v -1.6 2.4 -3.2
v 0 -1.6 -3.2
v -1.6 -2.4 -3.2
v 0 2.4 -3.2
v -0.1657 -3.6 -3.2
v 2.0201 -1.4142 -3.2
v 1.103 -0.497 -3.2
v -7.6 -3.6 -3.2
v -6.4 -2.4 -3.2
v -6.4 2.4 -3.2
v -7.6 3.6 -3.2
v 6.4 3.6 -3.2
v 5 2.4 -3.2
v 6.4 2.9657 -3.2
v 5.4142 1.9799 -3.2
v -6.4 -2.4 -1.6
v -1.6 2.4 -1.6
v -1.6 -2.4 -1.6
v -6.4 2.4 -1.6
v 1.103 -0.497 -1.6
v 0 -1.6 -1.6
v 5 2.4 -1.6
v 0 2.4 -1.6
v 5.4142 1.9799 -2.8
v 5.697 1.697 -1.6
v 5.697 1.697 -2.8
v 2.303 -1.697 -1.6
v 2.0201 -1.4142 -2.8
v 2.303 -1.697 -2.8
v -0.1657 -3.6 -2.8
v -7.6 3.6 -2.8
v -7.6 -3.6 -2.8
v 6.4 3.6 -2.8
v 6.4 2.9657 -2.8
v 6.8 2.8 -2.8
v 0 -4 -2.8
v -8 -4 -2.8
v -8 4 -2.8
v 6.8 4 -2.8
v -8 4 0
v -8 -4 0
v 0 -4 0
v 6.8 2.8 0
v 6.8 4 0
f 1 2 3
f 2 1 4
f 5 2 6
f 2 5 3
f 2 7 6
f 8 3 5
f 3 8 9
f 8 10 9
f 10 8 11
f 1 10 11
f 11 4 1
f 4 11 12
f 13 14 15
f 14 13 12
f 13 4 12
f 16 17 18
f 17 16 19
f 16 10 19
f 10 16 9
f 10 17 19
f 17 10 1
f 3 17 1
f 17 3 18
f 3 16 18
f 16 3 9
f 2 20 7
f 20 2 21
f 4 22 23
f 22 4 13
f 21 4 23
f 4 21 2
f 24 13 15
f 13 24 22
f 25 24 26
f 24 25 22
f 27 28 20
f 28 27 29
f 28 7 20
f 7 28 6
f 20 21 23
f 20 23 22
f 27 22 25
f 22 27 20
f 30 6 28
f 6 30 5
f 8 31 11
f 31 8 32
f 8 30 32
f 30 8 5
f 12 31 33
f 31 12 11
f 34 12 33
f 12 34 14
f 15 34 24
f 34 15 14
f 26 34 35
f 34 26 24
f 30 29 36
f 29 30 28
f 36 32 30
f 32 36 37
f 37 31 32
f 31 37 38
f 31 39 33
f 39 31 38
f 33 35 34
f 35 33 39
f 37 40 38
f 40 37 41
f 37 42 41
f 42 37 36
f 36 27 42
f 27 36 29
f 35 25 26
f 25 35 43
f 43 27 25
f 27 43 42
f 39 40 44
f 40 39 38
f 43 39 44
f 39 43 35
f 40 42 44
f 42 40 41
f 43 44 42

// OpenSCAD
// file: ../p/rect3.scad
use <../lib.scad>
function ldraw_lib__rect3() = [
// 0 Rectangle with 3 Edges
// 0 Name: rect3.dat
// 0 Author: Mark Kennedy [mkennedy]
// 0 !LDRAW_ORG Primitive UPDATE 2010-01
// 0 !LICENSE Licensed under CC BY 4.0 : see CAreadme.txt
// 
// 0 BFC CERTIFY CCW
  [0,"BFC","CERTIFY"],
  [0,"BFC","CCW"],
// 
// 0 !HISTORY 2003-08-01 [PTadmin] Official Update 2003-02
// 0 !HISTORY 2007-06-24 [PTadmin] Header formatted for Contributor Agreement
// 0 !HISTORY 2008-07-01 [PTadmin] Official Update 2008-01
// 0 !HISTORY 2010-01-17 [mikeheide] Change winding to CCW
// 0 !HISTORY 2010-04-05 [PTadmin] Official Update 2010-01
// 
// 
// 2 24 1 0 1 -1 0 1
  [2,24,1,0,1,-1,0,1],
// 2 24 1 0 1 1 0 -1
  [2,24,1,0,1,1,0,-1],
// 2 24 -1 0 1 -1 0 -1
  [2,24,-1,0,1,-1,0,-1],
// 4 16 -1 0 1 -1 0 -1 1 0 -1 1 0 1
  [4,16,-1,0,1,-1,0,-1,1,0,-1,1,0,1],
// 0 //
];
module ldraw_lib__rect3(step=0, col=false, unit=2/5, alt=false, line=0.2, solid=!$preview)
    makepoly(ldraw_lib__rect3(), step=step, col=col, unit=unit, alt=alt, line=line, solid=solid);
ldraw_lib__rect3(line=0.2);
// file: ../p/rect.scad
use <../lib.scad>
function ldraw_lib__rect() = [
// 0 Rectangle
// 0 Name: rect.dat
// 0 Author: James Jessiman
// 0 !LDRAW_ORG Primitive UPDATE 2010-01
// 0 !LICENSE Licensed under CC BY 4.0 : see CAreadme.txt
// 
// 0 BFC CERTIFY CCW
  [0,"BFC","CERTIFY"],
  [0,"BFC","CCW"],
// 
// 0 !HISTORY 2002-04-05 [hafhead] Added BFC statement
// 0 !HISTORY 2002-04-25 [PTadmin] Official Update 2002-02
// 0 !HISTORY 2007-06-24 [PTadmin] Header formatted for Contributor Agreement
// 0 !HISTORY 2008-07-01 [PTadmin] Official Update 2008-01
// 0 !HISTORY 2010-01-17 [mikeheide] changed winding to CCW
// 0 !HISTORY 2010-04-05 [PTadmin] Official Update 2010-01
// 
// 
// 2 24 1 0 1 -1 0 1
  [2,24,1,0,1,-1,0,1],
// 2 24 -1 0 1 -1 0 -1
  [2,24,-1,0,1,-1,0,-1],
// 2 24 -1 0 -1 1 0 -1
  [2,24,-1,0,-1,1,0,-1],
// 2 24 1 0 -1 1 0 1
  [2,24,1,0,-1,1,0,1],
// 4 16 -1 0 1 -1 0 -1 1 0 -1 1 0 1
  [4,16,-1,0,1,-1,0,-1,1,0,-1,1,0,1],
// 0
];
module ldraw_lib__rect(step=0, col=false, unit=2/5, alt=false, line=0.2, solid=!$preview)
    makepoly(ldraw_lib__rect(), step=step, col=col, unit=unit, alt=alt, line=line, solid=solid);
ldraw_lib__rect(line=0.2);
// file: ../p/box5.scad
use <../lib.scad>
function ldraw_lib__box5() = [
// 0 Box with 5 Faces and All Edges
// 0 Name: box5.dat
// 0 Author: James Jessiman
// 0 !LDRAW_ORG Primitive UPDATE 2012-01
// 0 !LICENSE Licensed under CC BY 4.0 : see CAreadme.txt
// 
// 0 BFC CERTIFY CCW
  [0,"BFC","CERTIFY"],
  [0,"BFC","CCW"],
// 
// 0 !HISTORY 2002-04-03 [sbliss] Modified for BFC compliance
// 0 !HISTORY 2002-04-25 [PTadmin] Official Update 2002-02
// 0 !HISTORY 2007-06-24 [PTadmin] Header formatted for Contributor Agreement
// 0 !HISTORY 2008-07-01 [PTadmin] Official Update 2008-01
// 0 !HISTORY 2012-02-16 [Philo] Changed to CCW
// 0 !HISTORY 2012-03-30 [PTadmin] Official Update 2012-01
// 
// 
// 2 24 1 1 1 -1 1 1
  [2,24,1,1,1,-1,1,1],
// 2 24 -1 1 1 -1 1 -1
  [2,24,-1,1,1,-1,1,-1],
// 2 24 -1 1 -1 1 1 -1
  [2,24,-1,1,-1,1,1,-1],
// 2 24 1 1 -1 1 1 1
  [2,24,1,1,-1,1,1,1],
// 2 24 1 0 1 -1 0 1
  [2,24,1,0,1,-1,0,1],
// 2 24 -1 0 1 -1 0 -1
  [2,24,-1,0,1,-1,0,-1],
// 2 24 -1 0 -1 1 0 -1
  [2,24,-1,0,-1,1,0,-1],
// 2 24 1 0 -1 1 0 1
  [2,24,1,0,-1,1,0,1],
// 2 24 1 0 1 1 1 1
  [2,24,1,0,1,1,1,1],
// 2 24 -1 0 1 -1 1 1
  [2,24,-1,0,1,-1,1,1],
// 2 24 1 0 -1 1 1 -1
  [2,24,1,0,-1,1,1,-1],
// 2 24 -1 0 -1 -1 1 -1
  [2,24,-1,0,-1,-1,1,-1],
// 4 16 -1 1 1 1 1 1 1 1 -1 -1 1 -1
  [4,16,-1,1,1,1,1,1,1,1,-1,-1,1,-1],
// 4 16 -1 1 1 -1 0 1 1 0 1 1 1 1
  [4,16,-1,1,1,-1,0,1,1,0,1,1,1,1],
// 4 16 -1 1 -1 -1 0 -1 -1 0 1 -1 1 1
  [4,16,-1,1,-1,-1,0,-1,-1,0,1,-1,1,1],
// 4 16 1 1 -1 1 0 -1 -1 0 -1 -1 1 -1
  [4,16,1,1,-1,1,0,-1,-1,0,-1,-1,1,-1],
// 4 16 1 1 1 1 0 1 1 0 -1 1 1 -1
  [4,16,1,1,1,1,0,1,1,0,-1,1,1,-1],
];
module ldraw_lib__box5(step=0, col=false, unit=2/5, alt=false, line=0.2, solid=!$preview)
    makepoly(ldraw_lib__box5(), step=step, col=col, unit=unit, alt=alt, line=line, solid=solid);
ldraw_lib__box5(line=0.2);
// file: ../p/box2-7.scad
use <../lib.scad>
function ldraw_lib__box2_7() = [
// 0 Box with  2 Faces without  7 Edges
// 0 Name: box2-7.dat
// 0 Author: Willy Tschager [Holly-Wood]
// 0 !LDRAW_ORG Primitive UPDATE 2024-01
// 0 !LICENSE Licensed under CC BY 4.0 : see CAreadme.txt
// 
// 0 BFC CERTIFY CCW
  [0,"BFC","CERTIFY"],
  [0,"BFC","CCW"],
// 
// 0 !HISTORY 2009-05-02 [PTadmin] Official Update 2009-01
// 0 !HISTORY 2024-01-02 [Holly-Wood] Complete re-write, original by guyvivan
// 0 !HISTORY 2024-01-29 [OrionP] Official Update 2024-01
// 
// 2 24 -1 1 -1 -1 1 1
  [2,24,-1,1,-1,-1,1,1],
// 2 24 1 1 1 1 1 -1
  [2,24,1,1,1,1,1,-1],
// 4 16 -1 1 1 1 1 1 1 1 -1 -1 1 -1
  [4,16,-1,1,1,1,1,1,1,1,-1,-1,1,-1],
// 
// 2 24 -1 1 1 -1 -1 1
  [2,24,-1,1,1,-1,-1,1],
// 2 24 1 1 1 1 -1 1
  [2,24,1,1,1,1,-1,1],
// 4 16 1 -1 1 1 1 1 -1 1 1 -1 -1 1
  [4,16,1,-1,1,1,1,1,-1,1,1,-1,-1,1],
// 
// 2 24 -1 1 1 1 1 1
  [2,24,-1,1,1,1,1,1],
];
module ldraw_lib__box2_7(step=0, col=false, unit=2/5, alt=false, line=0.2, solid=!$preview)
    makepoly(ldraw_lib__box2_7(), step=step, col=col, unit=unit, alt=alt, line=line, solid=solid);
ldraw_lib__box2_7(line=0.2);
// file: ../p/box2-5.scad
use <../lib.scad>
function ldraw_lib__box2_5() = [
// 0 Box with 2 Faces without 5 Edges
// 0 Name: box2-5.dat
// 0 Author: Steffen [Steffen]
// 0 !LDRAW_ORG Primitive UPDATE 2003-03
// 0 !LICENSE Licensed under CC BY 4.0 : see CAreadme.txt
// 
// 0 BFC CERTIFY CCW
  [0,"BFC","CERTIFY"],
  [0,"BFC","CCW"],
// 
// 0 !HISTORY 2003-12-19 [PTadmin] Official Update 2003-03
// 0 !HISTORY 2007-06-24 [PTadmin] Header formatted for Contributor Agreement
// 0 !HISTORY 2008-07-01 [PTadmin] Official Update 2008-01
// 
// 
// 2 24 1 1 1 -1 1 1
  [2,24,1,1,1,-1,1,1],
// 2 24 1 1 -1 -1 1 -1
  [2,24,1,1,-1,-1,1,-1],
// 2 24 1 -1 1 -1 -1 1
  [2,24,1,-1,1,-1,-1,1],
// 2 24 -1 -1 1 -1 1 1
  [2,24,-1,-1,1,-1,1,1],
// 2 24 1 -1 1 1 1 1
  [2,24,1,-1,1,1,1,1],
// 2 24 -1 1 -1 -1 1 1
  [2,24,-1,1,-1,-1,1,1],
// 2 24 1 1 -1 1 1 1
  [2,24,1,1,-1,1,1,1],
// 4 16 1 1 1 1 1 -1 -1 1 -1 -1 1 1
  [4,16,1,1,1,1,1,-1,-1,1,-1,-1,1,1],
// 4 16 1 1 1 -1 1 1 -1 -1 1 1 -1 1
  [4,16,1,1,1,-1,1,1,-1,-1,1,1,-1,1],
// 0
];
module ldraw_lib__box2_5(step=0, col=false, unit=2/5, alt=false, line=0.2, solid=!$preview)
    makepoly(ldraw_lib__box2_5(), step=step, col=col, unit=unit, alt=alt, line=line, solid=solid);
ldraw_lib__box2_5(line=0.2);
// file: s/5092s01.scad
use <../../lib.scad>
use <../../p/box2-5.scad>
use <../../p/box2-7.scad>
use <../../p/box5.scad>
use <../../p/rect.scad>
use <../../p/rect3.scad>
function ldraw_lib__s__5092s01() = [
// 0 ~Tile  1 x  2 Cut Right 45 Degree without Patternable Surfaces
// 0 Name: s\5092s01.dat
// 0 Author: Gerald Lasser [GeraldLasser]
// 0 !LDRAW_ORG Subpart UPDATE 2025-03
// 0 !LICENSE Licensed under CC BY 4.0 : see CAreadme.txt
// 
// 0 BFC CERTIFY CCW
  [0,"BFC","CERTIFY"],
  [0,"BFC","CCW"],
// 
// 0 !HISTORY 2025-03-30 [OrionP] Official Update 2025-03
// 
// 0 // Bottom
// 4 16 -4 8 6 0 8 6 0 8 -4 -4 8 -6
  [4,16,-4,8,6,0,8,6,0,8,-4,-4,8,-6],
// 4 16 5.0503 8 -3.5355 -.4142 8 -9 -4 8 -6 0 8 -4
  [4,16,5.0503,8,-3.5355,-.4142,8,-9,-4,8,-6,0,8,-4],
// 3 16 0 8 -4 2.7574 8 -1.2426 5.0503 8 -3.5355
  [3,16,0,8,-4,2.7574,8,-1.2426,5.0503,8,-3.5355],
// 4 16 -19 8 -9 -16 8 -6 -4 8 -6 -.4142 8 -9
  [4,16,-19,8,-9,-16,8,-6,-4,8,-6,-.4142,8,-9],
// 4 16 -19 8 9 -16 8 6 -16 8 -6 -19 8 -9
  [4,16,-19,8,9,-16,8,6,-16,8,-6,-19,8,-9],
// 3 16 -4 8 6 -16 8 6 -19 8 9
  [3,16,-4,8,6,-16,8,6,-19,8,9],
// 4 16 -19 8 9 16 8 9 0 8 6 -4 8 6
  [4,16,-19,8,9,16,8,9,0,8,6,-4,8,6],
// 4 16 16 8 7.4142 13.5355 8 4.9497 12.5 8 6 16 8 9
  [4,16,16,8,7.4142,13.5355,8,4.9497,12.5,8,6,16,8,9],
// 3 16 12.5 8 6 0 8 6 16 8 9
  [3,16,12.5,8,6,0,8,6,16,8,9],
// 0 BFC INVERTNEXT
  [0,"BFC","INVERTNEXT"],
// 1 16 -10 8 0 0 0 -6 0 -4 0 -6 0 0 box5.dat
  [1,16,-10,8,0,0,0,-6,0,-4,0,-6,0,0, ldraw_lib__box5()],
// 1 16 1.3787 6 -2.6213 0 0 1.3787 -2 0 0 0 -1 1.3787 rect3.dat
  [1,16,1.3787,6,-2.6213,0,0,1.3787,-2,0,0,0,-1,1.3787, ldraw_lib__rect3()],
// 0 BFC INVERTNEXT
  [0,"BFC","INVERTNEXT"],
// 1 16 6.25 6 1 0 0 -6.25 -2 0 0 0 5 0 box2-5.dat
  [1,16,6.25,6,1,0,0,-6.25,-2,0,0,0,5,0, ldraw_lib__box2_5()],
// 4 16 13.5355 8 4.9497 13.5355 7 4.9497 12.5 4 6 12.5 8 6
  [4,16,13.5355,8,4.9497,13.5355,7,4.9497,12.5,4,6,12.5,8,6],
// 4 16 12.5 4 6 13.5355 7 4.9497 14.2426 7 4.2426 14.2426 4 4.2426
  [4,16,12.5,4,6,13.5355,7,4.9497,14.2426,7,4.2426,14.2426,4,4.2426],
// 4 16 5.7574 7 -4.2426 5.0503 7 -3.5355 2.7574 4 -1.2426 5.7574 4 -4.2426
  [4,16,5.7574,7,-4.2426,5.0503,7,-3.5355,2.7574,4,-1.2426,5.7574,4,-4.2426],
// 4 16 2.7574 4 -1.2426 5.0503 7 -3.5355 5.0503 8 -3.5355 2.7574 8 -1.2426
  [4,16,2.7574,4,-1.2426,5.0503,7,-3.5355,5.0503,8,-3.5355,2.7574,8,-1.2426],
// 2 24 13.5355 7 4.9497 14.2426 7 4.2426
  [2,24,13.5355,7,4.9497,14.2426,7,4.2426],
// 2 24 5.0503 7 -3.5355 5.7574 7 -4.2426
  [2,24,5.0503,7,-3.5355,5.7574,7,-4.2426],
// 2 24 13.5355 8 4.9497 12.5 8 6
  [2,24,13.5355,8,4.9497,12.5,8,6],
// 2 24 2.7574 8 -1.2426 5.0503 8 -3.5355
  [2,24,2.7574,8,-1.2426,5.0503,8,-3.5355],
// 3 16 2.7574 4 -1.2426 0 4 -4 0 4 6
  [3,16,2.7574,4,-1.2426,0,4,-4,0,4,6],
// 3 16 2.7574 4 -1.2426 0 4 6 12.5 4 6
  [3,16,2.7574,4,-1.2426,0,4,6,12.5,4,6],
// 4 16 2.7574 4 -1.2426 12.5 4 6 14.2426 4 4.2426 5.7574 4 -4.2426
  [4,16,2.7574,4,-1.2426,12.5,4,6,14.2426,4,4.2426,5.7574,4,-4.2426],
// 2 24 12.5 4 6 14.2426 4 4.2426
  [2,24,12.5,4,6,14.2426,4,4.2426],
// 2 24 14.2426 4 4.2426 5.7574 4 -4.2426
  [2,24,14.2426,4,4.2426,5.7574,4,-4.2426],
// 2 24 5.7574 4 -4.2426 2.7574 4 -1.2426
  [2,24,5.7574,4,-4.2426,2.7574,4,-1.2426],
// 
// 0 // Lip
// 1 16 2.318 7.5 -6.2678 2.73225 -1 0 0 0 .5 2.73225 0 0 rect.dat
  [1,16,2.318,7.5,-6.2678,2.73225,-1,0,0,0,.5,2.73225,0,0, ldraw_lib__rect()],
// 1 16 -9.7071 7.5 0 0 -9.2929 0 .5 0 0 0 0 -9 box2-7.dat
  [1,16,-9.7071,7.5,0,0,-9.2929,0,.5,0,0,0,0,-9, ldraw_lib__box2_7()],
// 1 16 -1.5 7.5 8.2071 0 0 17.5 -.5 0 0 0 .7929 0 box2-5.dat
  [1,16,-1.5,7.5,8.2071,0,0,17.5,-.5,0,0,0,.7929,0, ldraw_lib__box2_5()],
// 1 16 14.76775 7.5 6.18195 0 0 -1.23225 -.5 0 0 0 1 -1.23225 rect3.dat
  [1,16,14.76775,7.5,6.18195,0,0,-1.23225,-.5,0,0,0,1,-1.23225, ldraw_lib__rect3()],
// 4 16 13.5355 7 4.9497 16 7 7.4142 17 7 7 14.2426 7 4.2426
  [4,16,13.5355,7,4.9497,16,7,7.4142,17,7,7,14.2426,7,4.2426],
// 4 16 -.4142 7 -9 5.0503 7 -3.5355 5.7574 7 -4.2426 0 7 -10
  [4,16,-.4142,7,-9,5.0503,7,-3.5355,5.7574,7,-4.2426,0,7,-10],
// 4 16 -.4142 7 -9 0 7 -10 -20 7 -10 -19 7 -9
  [4,16,-.4142,7,-9,0,7,-10,-20,7,-10,-19,7,-9],
// 4 16 -19 7 -9 -20 7 -10 -20 7 10 -19 7 9
  [4,16,-19,7,-9,-20,7,-10,-20,7,10,-19,7,9],
// 4 16 -19 7 9 -20 7 10 17 7 10 16 7 9
  [4,16,-19,7,9,-20,7,10,17,7,10,16,7,9],
// 4 16 16 7 9 17 7 10 17 7 7 16 7 7.4142
  [4,16,16,7,9,17,7,10,17,7,7,16,7,7.4142],
// 
// 0 // Outside
// 1 16 -10 3.5 0 0 -10 0 3.5 0 0 0 0 -10 box2-5.dat
  [1,16,-10,3.5,0,0,-10,0,3.5,0,0,0,0,-10, ldraw_lib__box2_5()],
// 4 16 0 0 -10 0 7 -10 5.7574 7 -4.2426 5.7574 4 -4.2426
  [4,16,0,0,-10,0,7,-10,5.7574,7,-4.2426,5.7574,4,-4.2426],
// 4 16 14.2426 4 4.2426 14.2426 7 4.2426 17 7 7 17 0 7
  [4,16,14.2426,4,4.2426,14.2426,7,4.2426,17,7,7,17,0,7],
// 4 16 5.7574 4 -4.2426 14.2426 4 4.2426 17 0 7 0 0 -10
  [4,16,5.7574,4,-4.2426,14.2426,4,4.2426,17,0,7,0,0,-10],
// 2 24 14.2426 7 4.2426 14.2426 4 4.2426
  [2,24,14.2426,7,4.2426,14.2426,4,4.2426],
// 2 24 5.7574 4 -4.2426 5.7574 7 -4.2426
  [2,24,5.7574,4,-4.2426,5.7574,7,-4.2426],
// 2 24 17 7 7 14.2426 7 4.2426
  [2,24,17,7,7,14.2426,7,4.2426],
// 2 24 5.7574 7 -4.2426 0 7 -10
  [2,24,5.7574,7,-4.2426,0,7,-10],
// 2 24 0 0 -10 17 0 7
  [2,24,0,0,-10,17,0,7],
// 2 24 17 0 7 17 7 7
  [2,24,17,0,7,17,7,7],
// 1 16 -1.5 3.5 8.5 0 0 18.5 -3.5 0 0 0 1.5 0 box2-7.dat
  [1,16,-1.5,3.5,8.5,0,0,18.5,-3.5,0,0,0,1.5,0, ldraw_lib__box2_7()],
];
module ldraw_lib__s__5092s01(step=0, col=false, unit=2/5, alt=false, line=0.2, solid=!$preview)
    makepoly(ldraw_lib__s__5092s01(), step=step, col=col, unit=unit, alt=alt, line=line, solid=solid);
ldraw_lib__s__5092s01(line=0.2);
// main file
use <../lib.scad>
use <s/5092s01.scad>
function ldraw_lib__5092() = [
// 0 Tile  1 x  2 Cut Right 45 Degree
// 0 Name: 5092.dat
// 0 Author: Gerald Lasser [GeraldLasser]
// 0 !LDRAW_ORG Part UPDATE 2025-03
// 0 !LICENSE Licensed under CC BY 4.0 : see CAreadme.txt
// 
// 0 BFC CERTIFY CCW
  [0,"BFC","CERTIFY"],
  [0,"BFC","CCW"],
// 
// 0 !HISTORY 2025-03-30 [OrionP] Official Update 2025-03
// 
// 1 16 0 0 0 1 0 0 0 1 0 0 0 1 s\5092s01.dat
  [1,16,0,0,0,1,0,0,0,1,0,0,0,1, ldraw_lib__s__5092s01()],
// 
// 4 16 -20 0 10 -20 0 -10 0 0 -10 17 0 10
  [4,16,-20,0,10,-20,0,-10,0,0,-10,17,0,10],
// 3 16 17 0 7 17 0 10 0 0 -10
  [3,16,17,0,7,17,0,10,0,0,-10],
];
module ldraw_lib__5092(step=0, col=false, unit=2/5, alt=false, line=0.2, solid=!$preview)
    makepoly(ldraw_lib__5092(), step=step, col=col, unit=unit, alt=alt, line=line, solid=solid);
ldraw_lib__5092(line=0.2);
